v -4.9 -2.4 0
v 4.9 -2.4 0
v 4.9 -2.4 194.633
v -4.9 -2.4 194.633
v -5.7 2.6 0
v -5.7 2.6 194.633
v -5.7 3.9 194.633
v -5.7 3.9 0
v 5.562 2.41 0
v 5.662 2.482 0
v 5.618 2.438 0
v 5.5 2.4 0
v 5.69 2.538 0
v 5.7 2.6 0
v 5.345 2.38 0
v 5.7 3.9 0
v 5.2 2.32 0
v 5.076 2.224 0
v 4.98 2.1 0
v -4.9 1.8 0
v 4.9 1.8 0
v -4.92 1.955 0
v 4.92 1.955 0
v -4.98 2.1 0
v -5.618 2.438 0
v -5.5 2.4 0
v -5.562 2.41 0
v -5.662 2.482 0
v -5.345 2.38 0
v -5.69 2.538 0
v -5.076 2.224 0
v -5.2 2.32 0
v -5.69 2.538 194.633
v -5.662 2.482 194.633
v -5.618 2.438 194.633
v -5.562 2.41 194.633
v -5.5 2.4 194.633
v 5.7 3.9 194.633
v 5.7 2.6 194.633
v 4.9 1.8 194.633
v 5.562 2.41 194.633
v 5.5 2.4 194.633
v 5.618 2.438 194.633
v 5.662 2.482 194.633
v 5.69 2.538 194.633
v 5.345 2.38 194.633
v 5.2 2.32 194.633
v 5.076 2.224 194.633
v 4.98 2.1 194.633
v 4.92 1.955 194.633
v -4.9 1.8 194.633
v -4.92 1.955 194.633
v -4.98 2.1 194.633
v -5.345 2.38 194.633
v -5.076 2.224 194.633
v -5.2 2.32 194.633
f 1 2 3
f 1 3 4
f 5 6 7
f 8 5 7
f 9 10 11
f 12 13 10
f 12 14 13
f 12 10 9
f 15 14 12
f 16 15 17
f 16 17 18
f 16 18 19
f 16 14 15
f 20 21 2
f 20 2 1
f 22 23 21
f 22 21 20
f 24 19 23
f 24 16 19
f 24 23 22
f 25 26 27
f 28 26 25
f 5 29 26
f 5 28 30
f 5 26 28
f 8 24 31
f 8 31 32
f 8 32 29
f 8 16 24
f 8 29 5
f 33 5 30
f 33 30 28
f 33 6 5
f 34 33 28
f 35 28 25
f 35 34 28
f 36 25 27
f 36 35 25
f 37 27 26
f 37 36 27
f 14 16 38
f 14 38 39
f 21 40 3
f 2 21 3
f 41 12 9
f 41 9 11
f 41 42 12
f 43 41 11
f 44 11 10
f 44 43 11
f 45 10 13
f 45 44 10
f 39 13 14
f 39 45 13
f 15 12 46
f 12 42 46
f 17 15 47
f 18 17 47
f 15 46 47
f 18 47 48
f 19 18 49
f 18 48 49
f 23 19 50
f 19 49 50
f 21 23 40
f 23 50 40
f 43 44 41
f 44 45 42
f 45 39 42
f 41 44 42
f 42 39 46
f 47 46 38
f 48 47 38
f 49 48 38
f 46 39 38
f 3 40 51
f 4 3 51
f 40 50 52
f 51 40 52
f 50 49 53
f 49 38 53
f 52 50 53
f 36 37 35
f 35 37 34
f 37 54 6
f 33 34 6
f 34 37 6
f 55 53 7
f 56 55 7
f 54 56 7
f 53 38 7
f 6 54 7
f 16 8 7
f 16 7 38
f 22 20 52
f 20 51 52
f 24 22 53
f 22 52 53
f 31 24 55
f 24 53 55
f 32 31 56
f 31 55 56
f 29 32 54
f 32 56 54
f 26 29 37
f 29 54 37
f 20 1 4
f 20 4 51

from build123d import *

# Parameters (mm, degrees)
BOSS_EXTRUDE1_DEPTH = 194.633333333
FILLET1_R           = 0.6
FILLET2_R           = 0.2


with BuildPart() as part:
    # Sketch1 → Boss-Extrude1 (new body)
    with BuildSketch(Plane.XY):
        Polygon((-5.7, 3.9), (5.7, 3.9), (5.7, 2.4), (4.9, 2.4), (4.9, -2.4), (-4.9, -2.4), (-4.9, 2.4), (-5.7, 2.4), align=None)
    extrude(amount=BOSS_EXTRUDE1_DEPTH)

    # Fillet1
    fillet1_edges = [part.edges().sort_by_distance(p)[0] for p in [
        (-4.9, 2.4, 97.316666667),
        (4.9, 2.4, 97.316666667),
    ]]
    fillet(fillet1_edges, radius=FILLET1_R)

    # Fillet2
    fillet2_edges = [part.edges().sort_by_distance(p)[0] for p in [
        (-5.7, 2.4, 97.316666667),
        (5.7, 2.4, 97.316666667),
    ]]
    fillet(fillet2_edges, radius=FILLET2_R - 0.0001)  # a hair under: the kernel refuses the full size


solid = part.part
